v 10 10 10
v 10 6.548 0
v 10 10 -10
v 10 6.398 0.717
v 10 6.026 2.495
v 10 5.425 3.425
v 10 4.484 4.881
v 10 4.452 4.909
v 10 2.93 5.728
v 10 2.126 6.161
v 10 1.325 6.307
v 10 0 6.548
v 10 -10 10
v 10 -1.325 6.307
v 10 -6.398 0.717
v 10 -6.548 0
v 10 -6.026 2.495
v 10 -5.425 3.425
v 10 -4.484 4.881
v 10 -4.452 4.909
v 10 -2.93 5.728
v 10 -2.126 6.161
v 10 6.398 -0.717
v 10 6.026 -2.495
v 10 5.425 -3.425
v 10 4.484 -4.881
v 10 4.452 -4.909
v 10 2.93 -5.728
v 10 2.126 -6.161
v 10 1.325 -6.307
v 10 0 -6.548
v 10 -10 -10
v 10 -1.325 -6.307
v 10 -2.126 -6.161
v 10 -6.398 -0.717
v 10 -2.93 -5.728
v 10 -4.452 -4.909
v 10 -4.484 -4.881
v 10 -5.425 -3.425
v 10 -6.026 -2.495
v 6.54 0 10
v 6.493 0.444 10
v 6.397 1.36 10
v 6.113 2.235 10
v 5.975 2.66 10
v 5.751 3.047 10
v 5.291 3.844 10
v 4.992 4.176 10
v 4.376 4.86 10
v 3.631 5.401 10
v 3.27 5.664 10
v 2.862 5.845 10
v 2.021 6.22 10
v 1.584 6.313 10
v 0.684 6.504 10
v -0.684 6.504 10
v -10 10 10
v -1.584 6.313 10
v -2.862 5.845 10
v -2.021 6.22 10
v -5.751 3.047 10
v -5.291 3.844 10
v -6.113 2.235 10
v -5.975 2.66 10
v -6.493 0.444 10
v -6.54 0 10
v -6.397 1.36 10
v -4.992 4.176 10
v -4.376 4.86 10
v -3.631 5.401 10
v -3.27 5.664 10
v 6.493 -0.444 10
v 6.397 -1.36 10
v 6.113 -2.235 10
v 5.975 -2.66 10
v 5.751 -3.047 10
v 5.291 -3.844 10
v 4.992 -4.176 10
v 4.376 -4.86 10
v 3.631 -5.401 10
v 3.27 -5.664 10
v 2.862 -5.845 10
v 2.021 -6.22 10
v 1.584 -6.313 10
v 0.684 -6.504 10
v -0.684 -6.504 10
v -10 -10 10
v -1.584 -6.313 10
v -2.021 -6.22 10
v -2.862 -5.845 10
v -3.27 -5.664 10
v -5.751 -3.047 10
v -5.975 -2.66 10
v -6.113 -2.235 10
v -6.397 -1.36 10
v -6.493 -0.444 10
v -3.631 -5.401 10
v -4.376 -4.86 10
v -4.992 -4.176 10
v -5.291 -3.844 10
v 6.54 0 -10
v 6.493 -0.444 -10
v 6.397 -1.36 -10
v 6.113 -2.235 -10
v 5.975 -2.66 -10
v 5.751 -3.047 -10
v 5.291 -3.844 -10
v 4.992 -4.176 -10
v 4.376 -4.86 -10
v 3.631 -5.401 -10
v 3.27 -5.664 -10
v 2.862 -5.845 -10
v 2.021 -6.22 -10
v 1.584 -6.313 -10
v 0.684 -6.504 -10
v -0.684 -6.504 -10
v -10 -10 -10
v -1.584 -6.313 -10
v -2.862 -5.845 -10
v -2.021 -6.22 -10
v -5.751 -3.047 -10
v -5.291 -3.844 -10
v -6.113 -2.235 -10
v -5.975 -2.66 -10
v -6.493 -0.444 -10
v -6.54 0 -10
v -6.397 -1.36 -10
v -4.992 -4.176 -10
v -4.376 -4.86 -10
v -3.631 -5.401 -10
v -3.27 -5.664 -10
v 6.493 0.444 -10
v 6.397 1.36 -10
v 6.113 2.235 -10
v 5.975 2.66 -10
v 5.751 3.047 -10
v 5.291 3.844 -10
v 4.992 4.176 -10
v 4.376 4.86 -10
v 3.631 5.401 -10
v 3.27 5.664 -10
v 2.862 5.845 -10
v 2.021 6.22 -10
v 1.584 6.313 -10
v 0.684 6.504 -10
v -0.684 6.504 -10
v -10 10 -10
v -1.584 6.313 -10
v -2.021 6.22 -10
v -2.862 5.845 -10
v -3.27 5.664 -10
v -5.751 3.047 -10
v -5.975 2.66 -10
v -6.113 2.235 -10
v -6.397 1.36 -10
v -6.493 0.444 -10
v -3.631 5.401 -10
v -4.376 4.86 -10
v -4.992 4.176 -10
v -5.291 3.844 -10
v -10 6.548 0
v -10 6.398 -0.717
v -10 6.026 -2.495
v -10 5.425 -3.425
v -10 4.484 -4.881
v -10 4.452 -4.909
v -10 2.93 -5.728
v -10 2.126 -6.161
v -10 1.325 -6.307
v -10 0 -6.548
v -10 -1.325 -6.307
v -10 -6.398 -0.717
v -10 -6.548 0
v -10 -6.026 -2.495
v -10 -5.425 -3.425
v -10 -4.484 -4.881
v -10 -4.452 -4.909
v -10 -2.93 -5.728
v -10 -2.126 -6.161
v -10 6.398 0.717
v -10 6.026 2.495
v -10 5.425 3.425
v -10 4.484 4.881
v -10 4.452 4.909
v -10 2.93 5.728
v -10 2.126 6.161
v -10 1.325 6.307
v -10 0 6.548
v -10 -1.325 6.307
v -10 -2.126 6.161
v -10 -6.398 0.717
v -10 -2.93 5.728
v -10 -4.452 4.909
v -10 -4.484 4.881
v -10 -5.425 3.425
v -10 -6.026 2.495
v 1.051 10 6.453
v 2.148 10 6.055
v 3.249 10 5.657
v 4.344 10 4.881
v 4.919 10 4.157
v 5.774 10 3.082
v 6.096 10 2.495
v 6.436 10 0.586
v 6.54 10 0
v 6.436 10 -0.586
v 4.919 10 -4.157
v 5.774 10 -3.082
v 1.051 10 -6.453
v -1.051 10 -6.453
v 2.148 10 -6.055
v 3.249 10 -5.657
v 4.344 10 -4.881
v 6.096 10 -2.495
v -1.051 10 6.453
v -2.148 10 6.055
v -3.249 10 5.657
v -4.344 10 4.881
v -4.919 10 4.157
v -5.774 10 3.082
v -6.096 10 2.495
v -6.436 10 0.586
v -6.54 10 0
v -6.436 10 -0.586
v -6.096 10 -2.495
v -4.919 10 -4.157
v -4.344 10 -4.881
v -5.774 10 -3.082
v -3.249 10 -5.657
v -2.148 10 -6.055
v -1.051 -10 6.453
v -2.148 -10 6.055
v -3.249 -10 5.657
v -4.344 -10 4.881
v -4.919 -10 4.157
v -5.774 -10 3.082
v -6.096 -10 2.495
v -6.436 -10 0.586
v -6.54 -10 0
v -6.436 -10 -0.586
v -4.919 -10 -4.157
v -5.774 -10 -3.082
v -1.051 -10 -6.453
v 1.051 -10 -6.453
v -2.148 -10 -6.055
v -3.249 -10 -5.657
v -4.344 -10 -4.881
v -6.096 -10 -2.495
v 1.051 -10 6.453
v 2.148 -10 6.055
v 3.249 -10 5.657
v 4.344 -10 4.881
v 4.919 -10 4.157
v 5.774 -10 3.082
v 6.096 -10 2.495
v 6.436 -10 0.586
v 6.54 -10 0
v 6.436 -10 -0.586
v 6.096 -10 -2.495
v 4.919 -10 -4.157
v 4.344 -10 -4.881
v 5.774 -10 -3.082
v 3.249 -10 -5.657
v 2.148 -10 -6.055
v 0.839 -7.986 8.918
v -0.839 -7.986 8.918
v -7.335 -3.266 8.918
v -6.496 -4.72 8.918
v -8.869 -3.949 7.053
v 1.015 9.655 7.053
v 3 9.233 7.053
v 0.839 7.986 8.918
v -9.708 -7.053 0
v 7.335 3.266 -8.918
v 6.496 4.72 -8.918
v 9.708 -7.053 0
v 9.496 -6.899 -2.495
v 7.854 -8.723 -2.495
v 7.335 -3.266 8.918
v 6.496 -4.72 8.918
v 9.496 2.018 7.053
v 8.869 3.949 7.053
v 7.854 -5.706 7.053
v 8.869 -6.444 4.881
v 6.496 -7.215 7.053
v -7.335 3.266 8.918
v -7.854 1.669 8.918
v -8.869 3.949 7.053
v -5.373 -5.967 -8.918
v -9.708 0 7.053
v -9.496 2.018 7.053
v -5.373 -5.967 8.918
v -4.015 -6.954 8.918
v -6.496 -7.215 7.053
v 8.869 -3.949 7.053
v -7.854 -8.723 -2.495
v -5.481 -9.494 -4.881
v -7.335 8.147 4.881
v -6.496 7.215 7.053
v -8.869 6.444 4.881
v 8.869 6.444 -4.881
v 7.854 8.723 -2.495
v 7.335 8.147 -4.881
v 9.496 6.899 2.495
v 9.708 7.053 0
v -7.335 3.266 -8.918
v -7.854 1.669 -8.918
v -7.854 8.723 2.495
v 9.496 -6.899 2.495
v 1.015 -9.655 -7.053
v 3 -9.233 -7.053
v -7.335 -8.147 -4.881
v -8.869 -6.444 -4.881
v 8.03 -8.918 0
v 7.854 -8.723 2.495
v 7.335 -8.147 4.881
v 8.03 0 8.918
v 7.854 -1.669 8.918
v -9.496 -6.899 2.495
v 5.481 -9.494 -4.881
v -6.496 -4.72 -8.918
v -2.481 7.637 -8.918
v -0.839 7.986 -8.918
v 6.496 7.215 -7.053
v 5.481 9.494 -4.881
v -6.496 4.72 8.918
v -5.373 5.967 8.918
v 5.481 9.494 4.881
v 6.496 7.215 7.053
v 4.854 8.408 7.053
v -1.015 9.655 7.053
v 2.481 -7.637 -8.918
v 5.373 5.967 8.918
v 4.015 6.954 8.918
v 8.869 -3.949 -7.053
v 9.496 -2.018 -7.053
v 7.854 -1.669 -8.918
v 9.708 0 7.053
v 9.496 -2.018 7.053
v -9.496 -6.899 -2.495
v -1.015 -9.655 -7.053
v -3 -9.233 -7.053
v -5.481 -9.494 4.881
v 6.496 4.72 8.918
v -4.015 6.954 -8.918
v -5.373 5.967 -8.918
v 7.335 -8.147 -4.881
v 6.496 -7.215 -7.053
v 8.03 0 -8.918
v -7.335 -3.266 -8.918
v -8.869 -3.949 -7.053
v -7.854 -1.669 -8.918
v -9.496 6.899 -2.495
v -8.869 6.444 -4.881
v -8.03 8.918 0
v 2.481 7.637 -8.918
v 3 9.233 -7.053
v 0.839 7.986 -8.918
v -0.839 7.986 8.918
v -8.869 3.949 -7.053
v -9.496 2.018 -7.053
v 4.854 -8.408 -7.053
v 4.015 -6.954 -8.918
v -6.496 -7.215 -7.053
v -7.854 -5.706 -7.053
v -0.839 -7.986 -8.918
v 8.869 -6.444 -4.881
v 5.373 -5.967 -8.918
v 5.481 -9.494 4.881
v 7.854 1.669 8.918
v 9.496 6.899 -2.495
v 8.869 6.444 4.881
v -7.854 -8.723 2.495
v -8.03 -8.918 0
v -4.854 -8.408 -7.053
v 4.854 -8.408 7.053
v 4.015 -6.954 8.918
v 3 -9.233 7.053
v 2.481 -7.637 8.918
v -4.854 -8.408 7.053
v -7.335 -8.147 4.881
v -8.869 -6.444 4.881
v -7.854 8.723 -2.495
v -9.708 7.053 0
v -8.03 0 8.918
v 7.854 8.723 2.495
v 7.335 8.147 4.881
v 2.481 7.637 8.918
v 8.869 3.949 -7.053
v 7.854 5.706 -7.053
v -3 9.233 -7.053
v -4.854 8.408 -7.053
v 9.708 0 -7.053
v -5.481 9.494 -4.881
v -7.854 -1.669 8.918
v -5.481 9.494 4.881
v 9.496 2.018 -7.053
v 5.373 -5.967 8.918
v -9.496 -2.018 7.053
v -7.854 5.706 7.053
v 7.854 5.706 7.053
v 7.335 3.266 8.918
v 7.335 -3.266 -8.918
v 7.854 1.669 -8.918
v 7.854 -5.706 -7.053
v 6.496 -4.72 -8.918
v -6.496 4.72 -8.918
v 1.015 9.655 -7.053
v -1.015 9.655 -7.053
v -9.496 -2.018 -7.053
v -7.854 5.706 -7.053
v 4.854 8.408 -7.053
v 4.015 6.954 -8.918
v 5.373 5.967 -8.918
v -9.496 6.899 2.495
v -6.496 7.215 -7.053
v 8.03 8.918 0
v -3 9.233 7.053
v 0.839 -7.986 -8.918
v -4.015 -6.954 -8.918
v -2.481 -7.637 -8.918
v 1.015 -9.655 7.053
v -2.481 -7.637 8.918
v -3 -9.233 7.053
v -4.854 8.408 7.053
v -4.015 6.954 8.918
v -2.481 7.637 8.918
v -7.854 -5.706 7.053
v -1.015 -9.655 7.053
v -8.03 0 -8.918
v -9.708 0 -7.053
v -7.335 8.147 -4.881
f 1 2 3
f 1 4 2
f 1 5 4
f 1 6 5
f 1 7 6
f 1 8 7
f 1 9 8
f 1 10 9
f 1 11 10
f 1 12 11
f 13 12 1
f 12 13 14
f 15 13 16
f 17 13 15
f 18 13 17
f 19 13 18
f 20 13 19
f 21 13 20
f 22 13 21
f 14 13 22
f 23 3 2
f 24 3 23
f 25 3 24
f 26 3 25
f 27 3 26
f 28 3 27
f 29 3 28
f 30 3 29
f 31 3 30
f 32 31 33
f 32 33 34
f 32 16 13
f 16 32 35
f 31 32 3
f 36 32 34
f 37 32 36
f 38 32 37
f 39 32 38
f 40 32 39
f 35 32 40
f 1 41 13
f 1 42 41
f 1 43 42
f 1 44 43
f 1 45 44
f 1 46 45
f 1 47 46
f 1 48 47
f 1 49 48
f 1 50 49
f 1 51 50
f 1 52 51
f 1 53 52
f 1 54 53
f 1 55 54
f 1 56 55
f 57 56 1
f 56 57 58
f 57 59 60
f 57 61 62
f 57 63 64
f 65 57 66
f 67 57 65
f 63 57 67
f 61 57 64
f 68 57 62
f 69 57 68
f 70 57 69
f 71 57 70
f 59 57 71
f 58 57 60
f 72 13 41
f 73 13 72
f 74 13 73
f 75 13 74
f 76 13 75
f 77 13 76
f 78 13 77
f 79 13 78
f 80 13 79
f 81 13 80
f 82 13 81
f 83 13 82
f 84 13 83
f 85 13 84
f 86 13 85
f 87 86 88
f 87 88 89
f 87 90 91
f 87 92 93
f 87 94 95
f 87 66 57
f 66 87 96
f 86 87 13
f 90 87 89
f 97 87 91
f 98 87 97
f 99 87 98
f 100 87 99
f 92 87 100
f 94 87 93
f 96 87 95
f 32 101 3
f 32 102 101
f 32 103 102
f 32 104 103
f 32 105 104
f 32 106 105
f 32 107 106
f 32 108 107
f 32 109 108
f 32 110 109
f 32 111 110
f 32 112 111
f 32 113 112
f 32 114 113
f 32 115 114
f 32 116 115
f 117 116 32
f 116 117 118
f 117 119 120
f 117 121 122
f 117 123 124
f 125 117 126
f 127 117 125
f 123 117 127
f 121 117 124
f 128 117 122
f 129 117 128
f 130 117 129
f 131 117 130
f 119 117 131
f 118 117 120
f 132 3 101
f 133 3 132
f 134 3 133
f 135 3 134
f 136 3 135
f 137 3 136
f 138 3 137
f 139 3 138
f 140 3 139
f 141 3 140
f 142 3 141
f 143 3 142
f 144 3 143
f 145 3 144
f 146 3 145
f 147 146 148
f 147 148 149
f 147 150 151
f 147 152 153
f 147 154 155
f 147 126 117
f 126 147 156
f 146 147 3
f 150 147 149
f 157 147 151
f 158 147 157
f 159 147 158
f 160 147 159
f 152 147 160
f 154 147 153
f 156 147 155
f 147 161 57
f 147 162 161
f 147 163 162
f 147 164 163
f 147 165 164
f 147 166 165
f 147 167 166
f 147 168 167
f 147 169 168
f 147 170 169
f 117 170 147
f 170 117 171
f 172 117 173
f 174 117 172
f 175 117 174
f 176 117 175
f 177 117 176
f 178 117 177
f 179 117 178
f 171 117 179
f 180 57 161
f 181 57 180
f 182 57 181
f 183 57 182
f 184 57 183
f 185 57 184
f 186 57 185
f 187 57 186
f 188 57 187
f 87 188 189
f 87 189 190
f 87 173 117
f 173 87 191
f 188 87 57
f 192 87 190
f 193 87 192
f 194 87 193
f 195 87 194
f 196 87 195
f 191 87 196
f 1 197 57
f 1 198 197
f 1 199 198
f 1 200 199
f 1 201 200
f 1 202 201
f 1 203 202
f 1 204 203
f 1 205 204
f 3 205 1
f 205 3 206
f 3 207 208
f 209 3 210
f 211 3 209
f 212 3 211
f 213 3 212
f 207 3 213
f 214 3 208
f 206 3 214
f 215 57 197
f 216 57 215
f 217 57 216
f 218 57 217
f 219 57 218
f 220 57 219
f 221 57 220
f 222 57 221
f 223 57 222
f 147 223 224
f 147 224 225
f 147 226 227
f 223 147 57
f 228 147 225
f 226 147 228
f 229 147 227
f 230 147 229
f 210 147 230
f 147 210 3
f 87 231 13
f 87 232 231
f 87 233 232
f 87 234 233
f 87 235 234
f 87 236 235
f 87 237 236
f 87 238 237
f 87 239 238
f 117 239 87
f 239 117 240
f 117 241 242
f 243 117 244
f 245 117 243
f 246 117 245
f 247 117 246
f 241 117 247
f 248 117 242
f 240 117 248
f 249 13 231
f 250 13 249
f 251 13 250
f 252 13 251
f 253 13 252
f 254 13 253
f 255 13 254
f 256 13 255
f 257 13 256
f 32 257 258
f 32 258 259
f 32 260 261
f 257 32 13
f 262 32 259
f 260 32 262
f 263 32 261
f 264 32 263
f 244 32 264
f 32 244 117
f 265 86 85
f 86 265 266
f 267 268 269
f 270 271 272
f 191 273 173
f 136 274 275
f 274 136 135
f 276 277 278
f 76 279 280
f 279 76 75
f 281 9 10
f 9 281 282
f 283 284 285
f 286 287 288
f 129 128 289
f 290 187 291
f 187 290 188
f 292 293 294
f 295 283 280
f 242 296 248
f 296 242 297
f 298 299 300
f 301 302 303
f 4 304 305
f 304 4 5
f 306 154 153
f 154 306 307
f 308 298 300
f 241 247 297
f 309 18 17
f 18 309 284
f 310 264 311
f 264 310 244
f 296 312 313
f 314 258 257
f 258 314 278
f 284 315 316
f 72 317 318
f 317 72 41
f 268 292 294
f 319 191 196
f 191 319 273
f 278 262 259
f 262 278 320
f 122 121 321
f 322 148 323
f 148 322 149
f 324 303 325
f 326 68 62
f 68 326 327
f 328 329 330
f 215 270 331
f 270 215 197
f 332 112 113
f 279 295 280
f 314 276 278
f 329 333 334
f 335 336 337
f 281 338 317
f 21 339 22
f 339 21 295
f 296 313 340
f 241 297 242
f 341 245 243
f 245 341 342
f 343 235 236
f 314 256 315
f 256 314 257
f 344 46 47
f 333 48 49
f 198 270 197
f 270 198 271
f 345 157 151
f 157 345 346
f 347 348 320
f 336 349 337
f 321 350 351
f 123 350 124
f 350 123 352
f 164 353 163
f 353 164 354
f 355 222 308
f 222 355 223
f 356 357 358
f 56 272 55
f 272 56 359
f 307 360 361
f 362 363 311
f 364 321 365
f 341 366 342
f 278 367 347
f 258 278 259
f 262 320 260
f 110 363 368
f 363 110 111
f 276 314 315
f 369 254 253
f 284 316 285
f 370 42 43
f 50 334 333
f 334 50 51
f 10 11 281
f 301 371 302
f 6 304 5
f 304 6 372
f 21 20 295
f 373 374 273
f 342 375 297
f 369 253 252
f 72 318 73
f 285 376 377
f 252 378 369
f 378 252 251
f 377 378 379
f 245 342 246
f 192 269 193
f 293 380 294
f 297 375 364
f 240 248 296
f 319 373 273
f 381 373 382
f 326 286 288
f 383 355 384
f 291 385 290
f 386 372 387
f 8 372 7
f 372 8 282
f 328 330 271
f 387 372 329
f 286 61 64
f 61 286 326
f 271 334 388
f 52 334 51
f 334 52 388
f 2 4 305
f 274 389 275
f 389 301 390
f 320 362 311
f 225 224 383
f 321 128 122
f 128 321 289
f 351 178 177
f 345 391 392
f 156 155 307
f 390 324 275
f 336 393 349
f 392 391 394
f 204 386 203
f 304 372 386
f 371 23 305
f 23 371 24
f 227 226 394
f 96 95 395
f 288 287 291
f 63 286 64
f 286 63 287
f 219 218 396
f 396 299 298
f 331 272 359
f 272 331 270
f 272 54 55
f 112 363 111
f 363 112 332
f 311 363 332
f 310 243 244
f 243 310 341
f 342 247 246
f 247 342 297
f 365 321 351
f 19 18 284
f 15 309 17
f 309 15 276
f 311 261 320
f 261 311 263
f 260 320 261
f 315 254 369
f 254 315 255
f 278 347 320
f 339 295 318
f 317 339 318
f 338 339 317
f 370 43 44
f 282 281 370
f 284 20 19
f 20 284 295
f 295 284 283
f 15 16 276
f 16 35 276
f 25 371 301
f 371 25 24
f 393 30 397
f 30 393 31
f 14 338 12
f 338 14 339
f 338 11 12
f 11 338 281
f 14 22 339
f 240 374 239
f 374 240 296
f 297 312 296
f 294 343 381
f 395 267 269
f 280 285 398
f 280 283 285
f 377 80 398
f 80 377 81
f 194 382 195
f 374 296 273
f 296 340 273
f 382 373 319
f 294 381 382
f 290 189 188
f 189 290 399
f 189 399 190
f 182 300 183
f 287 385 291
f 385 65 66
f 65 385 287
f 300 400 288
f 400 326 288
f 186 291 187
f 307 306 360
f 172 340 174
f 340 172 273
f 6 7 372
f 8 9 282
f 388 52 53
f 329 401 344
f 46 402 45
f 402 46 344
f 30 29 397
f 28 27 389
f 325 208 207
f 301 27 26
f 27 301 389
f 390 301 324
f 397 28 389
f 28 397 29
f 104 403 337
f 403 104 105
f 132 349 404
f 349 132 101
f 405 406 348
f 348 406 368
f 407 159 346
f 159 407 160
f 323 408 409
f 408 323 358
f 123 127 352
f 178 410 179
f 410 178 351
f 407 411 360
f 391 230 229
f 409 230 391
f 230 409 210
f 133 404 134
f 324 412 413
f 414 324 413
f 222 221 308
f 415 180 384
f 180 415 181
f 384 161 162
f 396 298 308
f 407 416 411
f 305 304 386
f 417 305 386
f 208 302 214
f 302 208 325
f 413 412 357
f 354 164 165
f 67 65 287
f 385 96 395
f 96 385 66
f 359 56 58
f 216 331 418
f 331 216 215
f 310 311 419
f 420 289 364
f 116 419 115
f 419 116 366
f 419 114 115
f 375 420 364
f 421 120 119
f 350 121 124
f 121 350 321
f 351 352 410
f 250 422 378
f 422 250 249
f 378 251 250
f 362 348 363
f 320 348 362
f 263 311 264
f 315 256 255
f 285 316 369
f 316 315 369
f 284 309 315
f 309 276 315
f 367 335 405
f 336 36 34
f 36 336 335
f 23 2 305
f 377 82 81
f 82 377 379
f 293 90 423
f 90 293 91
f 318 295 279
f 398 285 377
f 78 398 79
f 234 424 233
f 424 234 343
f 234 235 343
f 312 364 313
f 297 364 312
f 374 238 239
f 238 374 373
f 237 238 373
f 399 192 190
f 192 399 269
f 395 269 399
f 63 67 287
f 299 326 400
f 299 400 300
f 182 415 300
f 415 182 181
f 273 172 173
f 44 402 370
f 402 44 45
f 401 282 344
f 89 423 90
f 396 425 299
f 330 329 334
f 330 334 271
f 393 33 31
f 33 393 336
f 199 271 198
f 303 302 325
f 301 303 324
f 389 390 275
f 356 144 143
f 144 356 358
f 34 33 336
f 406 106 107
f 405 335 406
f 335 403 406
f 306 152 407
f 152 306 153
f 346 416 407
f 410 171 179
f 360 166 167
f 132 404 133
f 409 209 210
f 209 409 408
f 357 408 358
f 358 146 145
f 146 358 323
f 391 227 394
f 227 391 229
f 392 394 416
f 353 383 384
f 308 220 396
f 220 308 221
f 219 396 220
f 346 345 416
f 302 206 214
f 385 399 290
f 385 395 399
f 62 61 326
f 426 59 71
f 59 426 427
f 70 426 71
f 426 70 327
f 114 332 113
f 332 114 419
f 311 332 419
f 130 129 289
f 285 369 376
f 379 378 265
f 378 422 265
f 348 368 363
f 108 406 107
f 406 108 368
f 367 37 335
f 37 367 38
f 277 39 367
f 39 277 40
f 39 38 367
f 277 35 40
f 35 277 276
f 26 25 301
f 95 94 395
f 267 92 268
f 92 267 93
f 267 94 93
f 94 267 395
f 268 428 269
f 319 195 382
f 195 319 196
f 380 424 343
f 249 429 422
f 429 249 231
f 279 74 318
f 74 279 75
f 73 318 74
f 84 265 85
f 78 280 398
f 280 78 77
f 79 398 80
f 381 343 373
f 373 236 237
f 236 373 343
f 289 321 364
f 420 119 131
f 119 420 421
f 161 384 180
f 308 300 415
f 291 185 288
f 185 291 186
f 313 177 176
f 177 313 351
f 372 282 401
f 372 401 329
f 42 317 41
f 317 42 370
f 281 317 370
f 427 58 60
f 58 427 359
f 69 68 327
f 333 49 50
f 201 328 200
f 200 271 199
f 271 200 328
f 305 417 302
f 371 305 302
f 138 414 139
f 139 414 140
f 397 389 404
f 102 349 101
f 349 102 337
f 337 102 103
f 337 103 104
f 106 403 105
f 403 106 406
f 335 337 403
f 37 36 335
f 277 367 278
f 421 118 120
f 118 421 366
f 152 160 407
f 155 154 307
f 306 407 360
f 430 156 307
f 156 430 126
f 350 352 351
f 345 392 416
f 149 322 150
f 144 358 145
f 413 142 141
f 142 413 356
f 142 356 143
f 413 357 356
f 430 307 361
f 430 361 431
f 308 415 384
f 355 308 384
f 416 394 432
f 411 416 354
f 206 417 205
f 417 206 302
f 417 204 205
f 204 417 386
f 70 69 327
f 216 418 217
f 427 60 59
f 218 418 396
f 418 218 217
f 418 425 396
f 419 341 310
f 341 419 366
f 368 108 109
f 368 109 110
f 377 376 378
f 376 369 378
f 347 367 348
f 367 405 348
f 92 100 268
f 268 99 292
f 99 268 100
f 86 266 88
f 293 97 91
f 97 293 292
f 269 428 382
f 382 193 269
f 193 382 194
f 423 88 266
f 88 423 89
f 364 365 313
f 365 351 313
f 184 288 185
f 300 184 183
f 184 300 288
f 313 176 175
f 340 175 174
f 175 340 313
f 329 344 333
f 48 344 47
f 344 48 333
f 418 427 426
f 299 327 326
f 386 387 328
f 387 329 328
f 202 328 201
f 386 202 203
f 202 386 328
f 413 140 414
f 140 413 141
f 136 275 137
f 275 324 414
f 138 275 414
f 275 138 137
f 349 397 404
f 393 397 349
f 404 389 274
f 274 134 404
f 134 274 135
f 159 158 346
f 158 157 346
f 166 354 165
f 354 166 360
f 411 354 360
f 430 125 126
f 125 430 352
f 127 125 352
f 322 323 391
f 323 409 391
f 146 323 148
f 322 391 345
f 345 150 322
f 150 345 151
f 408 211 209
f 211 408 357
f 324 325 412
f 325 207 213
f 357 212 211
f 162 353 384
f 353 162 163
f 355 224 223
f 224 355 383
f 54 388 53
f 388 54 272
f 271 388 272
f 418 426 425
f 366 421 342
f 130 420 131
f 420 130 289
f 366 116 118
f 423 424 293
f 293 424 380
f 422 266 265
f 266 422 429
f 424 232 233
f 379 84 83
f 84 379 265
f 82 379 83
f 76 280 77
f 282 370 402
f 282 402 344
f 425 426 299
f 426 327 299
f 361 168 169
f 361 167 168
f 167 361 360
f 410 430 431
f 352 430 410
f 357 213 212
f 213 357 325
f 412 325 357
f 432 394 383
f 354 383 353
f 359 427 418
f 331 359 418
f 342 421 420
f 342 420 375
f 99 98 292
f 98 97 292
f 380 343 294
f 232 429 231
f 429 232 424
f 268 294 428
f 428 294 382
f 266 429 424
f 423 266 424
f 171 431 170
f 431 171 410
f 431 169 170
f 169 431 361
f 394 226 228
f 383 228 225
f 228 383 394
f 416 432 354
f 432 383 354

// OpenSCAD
// Milestone-1 canonical: a centered cube with a spherical bite out of it.
difference() {
  cube(20, center=true);
  sphere(12);
}
